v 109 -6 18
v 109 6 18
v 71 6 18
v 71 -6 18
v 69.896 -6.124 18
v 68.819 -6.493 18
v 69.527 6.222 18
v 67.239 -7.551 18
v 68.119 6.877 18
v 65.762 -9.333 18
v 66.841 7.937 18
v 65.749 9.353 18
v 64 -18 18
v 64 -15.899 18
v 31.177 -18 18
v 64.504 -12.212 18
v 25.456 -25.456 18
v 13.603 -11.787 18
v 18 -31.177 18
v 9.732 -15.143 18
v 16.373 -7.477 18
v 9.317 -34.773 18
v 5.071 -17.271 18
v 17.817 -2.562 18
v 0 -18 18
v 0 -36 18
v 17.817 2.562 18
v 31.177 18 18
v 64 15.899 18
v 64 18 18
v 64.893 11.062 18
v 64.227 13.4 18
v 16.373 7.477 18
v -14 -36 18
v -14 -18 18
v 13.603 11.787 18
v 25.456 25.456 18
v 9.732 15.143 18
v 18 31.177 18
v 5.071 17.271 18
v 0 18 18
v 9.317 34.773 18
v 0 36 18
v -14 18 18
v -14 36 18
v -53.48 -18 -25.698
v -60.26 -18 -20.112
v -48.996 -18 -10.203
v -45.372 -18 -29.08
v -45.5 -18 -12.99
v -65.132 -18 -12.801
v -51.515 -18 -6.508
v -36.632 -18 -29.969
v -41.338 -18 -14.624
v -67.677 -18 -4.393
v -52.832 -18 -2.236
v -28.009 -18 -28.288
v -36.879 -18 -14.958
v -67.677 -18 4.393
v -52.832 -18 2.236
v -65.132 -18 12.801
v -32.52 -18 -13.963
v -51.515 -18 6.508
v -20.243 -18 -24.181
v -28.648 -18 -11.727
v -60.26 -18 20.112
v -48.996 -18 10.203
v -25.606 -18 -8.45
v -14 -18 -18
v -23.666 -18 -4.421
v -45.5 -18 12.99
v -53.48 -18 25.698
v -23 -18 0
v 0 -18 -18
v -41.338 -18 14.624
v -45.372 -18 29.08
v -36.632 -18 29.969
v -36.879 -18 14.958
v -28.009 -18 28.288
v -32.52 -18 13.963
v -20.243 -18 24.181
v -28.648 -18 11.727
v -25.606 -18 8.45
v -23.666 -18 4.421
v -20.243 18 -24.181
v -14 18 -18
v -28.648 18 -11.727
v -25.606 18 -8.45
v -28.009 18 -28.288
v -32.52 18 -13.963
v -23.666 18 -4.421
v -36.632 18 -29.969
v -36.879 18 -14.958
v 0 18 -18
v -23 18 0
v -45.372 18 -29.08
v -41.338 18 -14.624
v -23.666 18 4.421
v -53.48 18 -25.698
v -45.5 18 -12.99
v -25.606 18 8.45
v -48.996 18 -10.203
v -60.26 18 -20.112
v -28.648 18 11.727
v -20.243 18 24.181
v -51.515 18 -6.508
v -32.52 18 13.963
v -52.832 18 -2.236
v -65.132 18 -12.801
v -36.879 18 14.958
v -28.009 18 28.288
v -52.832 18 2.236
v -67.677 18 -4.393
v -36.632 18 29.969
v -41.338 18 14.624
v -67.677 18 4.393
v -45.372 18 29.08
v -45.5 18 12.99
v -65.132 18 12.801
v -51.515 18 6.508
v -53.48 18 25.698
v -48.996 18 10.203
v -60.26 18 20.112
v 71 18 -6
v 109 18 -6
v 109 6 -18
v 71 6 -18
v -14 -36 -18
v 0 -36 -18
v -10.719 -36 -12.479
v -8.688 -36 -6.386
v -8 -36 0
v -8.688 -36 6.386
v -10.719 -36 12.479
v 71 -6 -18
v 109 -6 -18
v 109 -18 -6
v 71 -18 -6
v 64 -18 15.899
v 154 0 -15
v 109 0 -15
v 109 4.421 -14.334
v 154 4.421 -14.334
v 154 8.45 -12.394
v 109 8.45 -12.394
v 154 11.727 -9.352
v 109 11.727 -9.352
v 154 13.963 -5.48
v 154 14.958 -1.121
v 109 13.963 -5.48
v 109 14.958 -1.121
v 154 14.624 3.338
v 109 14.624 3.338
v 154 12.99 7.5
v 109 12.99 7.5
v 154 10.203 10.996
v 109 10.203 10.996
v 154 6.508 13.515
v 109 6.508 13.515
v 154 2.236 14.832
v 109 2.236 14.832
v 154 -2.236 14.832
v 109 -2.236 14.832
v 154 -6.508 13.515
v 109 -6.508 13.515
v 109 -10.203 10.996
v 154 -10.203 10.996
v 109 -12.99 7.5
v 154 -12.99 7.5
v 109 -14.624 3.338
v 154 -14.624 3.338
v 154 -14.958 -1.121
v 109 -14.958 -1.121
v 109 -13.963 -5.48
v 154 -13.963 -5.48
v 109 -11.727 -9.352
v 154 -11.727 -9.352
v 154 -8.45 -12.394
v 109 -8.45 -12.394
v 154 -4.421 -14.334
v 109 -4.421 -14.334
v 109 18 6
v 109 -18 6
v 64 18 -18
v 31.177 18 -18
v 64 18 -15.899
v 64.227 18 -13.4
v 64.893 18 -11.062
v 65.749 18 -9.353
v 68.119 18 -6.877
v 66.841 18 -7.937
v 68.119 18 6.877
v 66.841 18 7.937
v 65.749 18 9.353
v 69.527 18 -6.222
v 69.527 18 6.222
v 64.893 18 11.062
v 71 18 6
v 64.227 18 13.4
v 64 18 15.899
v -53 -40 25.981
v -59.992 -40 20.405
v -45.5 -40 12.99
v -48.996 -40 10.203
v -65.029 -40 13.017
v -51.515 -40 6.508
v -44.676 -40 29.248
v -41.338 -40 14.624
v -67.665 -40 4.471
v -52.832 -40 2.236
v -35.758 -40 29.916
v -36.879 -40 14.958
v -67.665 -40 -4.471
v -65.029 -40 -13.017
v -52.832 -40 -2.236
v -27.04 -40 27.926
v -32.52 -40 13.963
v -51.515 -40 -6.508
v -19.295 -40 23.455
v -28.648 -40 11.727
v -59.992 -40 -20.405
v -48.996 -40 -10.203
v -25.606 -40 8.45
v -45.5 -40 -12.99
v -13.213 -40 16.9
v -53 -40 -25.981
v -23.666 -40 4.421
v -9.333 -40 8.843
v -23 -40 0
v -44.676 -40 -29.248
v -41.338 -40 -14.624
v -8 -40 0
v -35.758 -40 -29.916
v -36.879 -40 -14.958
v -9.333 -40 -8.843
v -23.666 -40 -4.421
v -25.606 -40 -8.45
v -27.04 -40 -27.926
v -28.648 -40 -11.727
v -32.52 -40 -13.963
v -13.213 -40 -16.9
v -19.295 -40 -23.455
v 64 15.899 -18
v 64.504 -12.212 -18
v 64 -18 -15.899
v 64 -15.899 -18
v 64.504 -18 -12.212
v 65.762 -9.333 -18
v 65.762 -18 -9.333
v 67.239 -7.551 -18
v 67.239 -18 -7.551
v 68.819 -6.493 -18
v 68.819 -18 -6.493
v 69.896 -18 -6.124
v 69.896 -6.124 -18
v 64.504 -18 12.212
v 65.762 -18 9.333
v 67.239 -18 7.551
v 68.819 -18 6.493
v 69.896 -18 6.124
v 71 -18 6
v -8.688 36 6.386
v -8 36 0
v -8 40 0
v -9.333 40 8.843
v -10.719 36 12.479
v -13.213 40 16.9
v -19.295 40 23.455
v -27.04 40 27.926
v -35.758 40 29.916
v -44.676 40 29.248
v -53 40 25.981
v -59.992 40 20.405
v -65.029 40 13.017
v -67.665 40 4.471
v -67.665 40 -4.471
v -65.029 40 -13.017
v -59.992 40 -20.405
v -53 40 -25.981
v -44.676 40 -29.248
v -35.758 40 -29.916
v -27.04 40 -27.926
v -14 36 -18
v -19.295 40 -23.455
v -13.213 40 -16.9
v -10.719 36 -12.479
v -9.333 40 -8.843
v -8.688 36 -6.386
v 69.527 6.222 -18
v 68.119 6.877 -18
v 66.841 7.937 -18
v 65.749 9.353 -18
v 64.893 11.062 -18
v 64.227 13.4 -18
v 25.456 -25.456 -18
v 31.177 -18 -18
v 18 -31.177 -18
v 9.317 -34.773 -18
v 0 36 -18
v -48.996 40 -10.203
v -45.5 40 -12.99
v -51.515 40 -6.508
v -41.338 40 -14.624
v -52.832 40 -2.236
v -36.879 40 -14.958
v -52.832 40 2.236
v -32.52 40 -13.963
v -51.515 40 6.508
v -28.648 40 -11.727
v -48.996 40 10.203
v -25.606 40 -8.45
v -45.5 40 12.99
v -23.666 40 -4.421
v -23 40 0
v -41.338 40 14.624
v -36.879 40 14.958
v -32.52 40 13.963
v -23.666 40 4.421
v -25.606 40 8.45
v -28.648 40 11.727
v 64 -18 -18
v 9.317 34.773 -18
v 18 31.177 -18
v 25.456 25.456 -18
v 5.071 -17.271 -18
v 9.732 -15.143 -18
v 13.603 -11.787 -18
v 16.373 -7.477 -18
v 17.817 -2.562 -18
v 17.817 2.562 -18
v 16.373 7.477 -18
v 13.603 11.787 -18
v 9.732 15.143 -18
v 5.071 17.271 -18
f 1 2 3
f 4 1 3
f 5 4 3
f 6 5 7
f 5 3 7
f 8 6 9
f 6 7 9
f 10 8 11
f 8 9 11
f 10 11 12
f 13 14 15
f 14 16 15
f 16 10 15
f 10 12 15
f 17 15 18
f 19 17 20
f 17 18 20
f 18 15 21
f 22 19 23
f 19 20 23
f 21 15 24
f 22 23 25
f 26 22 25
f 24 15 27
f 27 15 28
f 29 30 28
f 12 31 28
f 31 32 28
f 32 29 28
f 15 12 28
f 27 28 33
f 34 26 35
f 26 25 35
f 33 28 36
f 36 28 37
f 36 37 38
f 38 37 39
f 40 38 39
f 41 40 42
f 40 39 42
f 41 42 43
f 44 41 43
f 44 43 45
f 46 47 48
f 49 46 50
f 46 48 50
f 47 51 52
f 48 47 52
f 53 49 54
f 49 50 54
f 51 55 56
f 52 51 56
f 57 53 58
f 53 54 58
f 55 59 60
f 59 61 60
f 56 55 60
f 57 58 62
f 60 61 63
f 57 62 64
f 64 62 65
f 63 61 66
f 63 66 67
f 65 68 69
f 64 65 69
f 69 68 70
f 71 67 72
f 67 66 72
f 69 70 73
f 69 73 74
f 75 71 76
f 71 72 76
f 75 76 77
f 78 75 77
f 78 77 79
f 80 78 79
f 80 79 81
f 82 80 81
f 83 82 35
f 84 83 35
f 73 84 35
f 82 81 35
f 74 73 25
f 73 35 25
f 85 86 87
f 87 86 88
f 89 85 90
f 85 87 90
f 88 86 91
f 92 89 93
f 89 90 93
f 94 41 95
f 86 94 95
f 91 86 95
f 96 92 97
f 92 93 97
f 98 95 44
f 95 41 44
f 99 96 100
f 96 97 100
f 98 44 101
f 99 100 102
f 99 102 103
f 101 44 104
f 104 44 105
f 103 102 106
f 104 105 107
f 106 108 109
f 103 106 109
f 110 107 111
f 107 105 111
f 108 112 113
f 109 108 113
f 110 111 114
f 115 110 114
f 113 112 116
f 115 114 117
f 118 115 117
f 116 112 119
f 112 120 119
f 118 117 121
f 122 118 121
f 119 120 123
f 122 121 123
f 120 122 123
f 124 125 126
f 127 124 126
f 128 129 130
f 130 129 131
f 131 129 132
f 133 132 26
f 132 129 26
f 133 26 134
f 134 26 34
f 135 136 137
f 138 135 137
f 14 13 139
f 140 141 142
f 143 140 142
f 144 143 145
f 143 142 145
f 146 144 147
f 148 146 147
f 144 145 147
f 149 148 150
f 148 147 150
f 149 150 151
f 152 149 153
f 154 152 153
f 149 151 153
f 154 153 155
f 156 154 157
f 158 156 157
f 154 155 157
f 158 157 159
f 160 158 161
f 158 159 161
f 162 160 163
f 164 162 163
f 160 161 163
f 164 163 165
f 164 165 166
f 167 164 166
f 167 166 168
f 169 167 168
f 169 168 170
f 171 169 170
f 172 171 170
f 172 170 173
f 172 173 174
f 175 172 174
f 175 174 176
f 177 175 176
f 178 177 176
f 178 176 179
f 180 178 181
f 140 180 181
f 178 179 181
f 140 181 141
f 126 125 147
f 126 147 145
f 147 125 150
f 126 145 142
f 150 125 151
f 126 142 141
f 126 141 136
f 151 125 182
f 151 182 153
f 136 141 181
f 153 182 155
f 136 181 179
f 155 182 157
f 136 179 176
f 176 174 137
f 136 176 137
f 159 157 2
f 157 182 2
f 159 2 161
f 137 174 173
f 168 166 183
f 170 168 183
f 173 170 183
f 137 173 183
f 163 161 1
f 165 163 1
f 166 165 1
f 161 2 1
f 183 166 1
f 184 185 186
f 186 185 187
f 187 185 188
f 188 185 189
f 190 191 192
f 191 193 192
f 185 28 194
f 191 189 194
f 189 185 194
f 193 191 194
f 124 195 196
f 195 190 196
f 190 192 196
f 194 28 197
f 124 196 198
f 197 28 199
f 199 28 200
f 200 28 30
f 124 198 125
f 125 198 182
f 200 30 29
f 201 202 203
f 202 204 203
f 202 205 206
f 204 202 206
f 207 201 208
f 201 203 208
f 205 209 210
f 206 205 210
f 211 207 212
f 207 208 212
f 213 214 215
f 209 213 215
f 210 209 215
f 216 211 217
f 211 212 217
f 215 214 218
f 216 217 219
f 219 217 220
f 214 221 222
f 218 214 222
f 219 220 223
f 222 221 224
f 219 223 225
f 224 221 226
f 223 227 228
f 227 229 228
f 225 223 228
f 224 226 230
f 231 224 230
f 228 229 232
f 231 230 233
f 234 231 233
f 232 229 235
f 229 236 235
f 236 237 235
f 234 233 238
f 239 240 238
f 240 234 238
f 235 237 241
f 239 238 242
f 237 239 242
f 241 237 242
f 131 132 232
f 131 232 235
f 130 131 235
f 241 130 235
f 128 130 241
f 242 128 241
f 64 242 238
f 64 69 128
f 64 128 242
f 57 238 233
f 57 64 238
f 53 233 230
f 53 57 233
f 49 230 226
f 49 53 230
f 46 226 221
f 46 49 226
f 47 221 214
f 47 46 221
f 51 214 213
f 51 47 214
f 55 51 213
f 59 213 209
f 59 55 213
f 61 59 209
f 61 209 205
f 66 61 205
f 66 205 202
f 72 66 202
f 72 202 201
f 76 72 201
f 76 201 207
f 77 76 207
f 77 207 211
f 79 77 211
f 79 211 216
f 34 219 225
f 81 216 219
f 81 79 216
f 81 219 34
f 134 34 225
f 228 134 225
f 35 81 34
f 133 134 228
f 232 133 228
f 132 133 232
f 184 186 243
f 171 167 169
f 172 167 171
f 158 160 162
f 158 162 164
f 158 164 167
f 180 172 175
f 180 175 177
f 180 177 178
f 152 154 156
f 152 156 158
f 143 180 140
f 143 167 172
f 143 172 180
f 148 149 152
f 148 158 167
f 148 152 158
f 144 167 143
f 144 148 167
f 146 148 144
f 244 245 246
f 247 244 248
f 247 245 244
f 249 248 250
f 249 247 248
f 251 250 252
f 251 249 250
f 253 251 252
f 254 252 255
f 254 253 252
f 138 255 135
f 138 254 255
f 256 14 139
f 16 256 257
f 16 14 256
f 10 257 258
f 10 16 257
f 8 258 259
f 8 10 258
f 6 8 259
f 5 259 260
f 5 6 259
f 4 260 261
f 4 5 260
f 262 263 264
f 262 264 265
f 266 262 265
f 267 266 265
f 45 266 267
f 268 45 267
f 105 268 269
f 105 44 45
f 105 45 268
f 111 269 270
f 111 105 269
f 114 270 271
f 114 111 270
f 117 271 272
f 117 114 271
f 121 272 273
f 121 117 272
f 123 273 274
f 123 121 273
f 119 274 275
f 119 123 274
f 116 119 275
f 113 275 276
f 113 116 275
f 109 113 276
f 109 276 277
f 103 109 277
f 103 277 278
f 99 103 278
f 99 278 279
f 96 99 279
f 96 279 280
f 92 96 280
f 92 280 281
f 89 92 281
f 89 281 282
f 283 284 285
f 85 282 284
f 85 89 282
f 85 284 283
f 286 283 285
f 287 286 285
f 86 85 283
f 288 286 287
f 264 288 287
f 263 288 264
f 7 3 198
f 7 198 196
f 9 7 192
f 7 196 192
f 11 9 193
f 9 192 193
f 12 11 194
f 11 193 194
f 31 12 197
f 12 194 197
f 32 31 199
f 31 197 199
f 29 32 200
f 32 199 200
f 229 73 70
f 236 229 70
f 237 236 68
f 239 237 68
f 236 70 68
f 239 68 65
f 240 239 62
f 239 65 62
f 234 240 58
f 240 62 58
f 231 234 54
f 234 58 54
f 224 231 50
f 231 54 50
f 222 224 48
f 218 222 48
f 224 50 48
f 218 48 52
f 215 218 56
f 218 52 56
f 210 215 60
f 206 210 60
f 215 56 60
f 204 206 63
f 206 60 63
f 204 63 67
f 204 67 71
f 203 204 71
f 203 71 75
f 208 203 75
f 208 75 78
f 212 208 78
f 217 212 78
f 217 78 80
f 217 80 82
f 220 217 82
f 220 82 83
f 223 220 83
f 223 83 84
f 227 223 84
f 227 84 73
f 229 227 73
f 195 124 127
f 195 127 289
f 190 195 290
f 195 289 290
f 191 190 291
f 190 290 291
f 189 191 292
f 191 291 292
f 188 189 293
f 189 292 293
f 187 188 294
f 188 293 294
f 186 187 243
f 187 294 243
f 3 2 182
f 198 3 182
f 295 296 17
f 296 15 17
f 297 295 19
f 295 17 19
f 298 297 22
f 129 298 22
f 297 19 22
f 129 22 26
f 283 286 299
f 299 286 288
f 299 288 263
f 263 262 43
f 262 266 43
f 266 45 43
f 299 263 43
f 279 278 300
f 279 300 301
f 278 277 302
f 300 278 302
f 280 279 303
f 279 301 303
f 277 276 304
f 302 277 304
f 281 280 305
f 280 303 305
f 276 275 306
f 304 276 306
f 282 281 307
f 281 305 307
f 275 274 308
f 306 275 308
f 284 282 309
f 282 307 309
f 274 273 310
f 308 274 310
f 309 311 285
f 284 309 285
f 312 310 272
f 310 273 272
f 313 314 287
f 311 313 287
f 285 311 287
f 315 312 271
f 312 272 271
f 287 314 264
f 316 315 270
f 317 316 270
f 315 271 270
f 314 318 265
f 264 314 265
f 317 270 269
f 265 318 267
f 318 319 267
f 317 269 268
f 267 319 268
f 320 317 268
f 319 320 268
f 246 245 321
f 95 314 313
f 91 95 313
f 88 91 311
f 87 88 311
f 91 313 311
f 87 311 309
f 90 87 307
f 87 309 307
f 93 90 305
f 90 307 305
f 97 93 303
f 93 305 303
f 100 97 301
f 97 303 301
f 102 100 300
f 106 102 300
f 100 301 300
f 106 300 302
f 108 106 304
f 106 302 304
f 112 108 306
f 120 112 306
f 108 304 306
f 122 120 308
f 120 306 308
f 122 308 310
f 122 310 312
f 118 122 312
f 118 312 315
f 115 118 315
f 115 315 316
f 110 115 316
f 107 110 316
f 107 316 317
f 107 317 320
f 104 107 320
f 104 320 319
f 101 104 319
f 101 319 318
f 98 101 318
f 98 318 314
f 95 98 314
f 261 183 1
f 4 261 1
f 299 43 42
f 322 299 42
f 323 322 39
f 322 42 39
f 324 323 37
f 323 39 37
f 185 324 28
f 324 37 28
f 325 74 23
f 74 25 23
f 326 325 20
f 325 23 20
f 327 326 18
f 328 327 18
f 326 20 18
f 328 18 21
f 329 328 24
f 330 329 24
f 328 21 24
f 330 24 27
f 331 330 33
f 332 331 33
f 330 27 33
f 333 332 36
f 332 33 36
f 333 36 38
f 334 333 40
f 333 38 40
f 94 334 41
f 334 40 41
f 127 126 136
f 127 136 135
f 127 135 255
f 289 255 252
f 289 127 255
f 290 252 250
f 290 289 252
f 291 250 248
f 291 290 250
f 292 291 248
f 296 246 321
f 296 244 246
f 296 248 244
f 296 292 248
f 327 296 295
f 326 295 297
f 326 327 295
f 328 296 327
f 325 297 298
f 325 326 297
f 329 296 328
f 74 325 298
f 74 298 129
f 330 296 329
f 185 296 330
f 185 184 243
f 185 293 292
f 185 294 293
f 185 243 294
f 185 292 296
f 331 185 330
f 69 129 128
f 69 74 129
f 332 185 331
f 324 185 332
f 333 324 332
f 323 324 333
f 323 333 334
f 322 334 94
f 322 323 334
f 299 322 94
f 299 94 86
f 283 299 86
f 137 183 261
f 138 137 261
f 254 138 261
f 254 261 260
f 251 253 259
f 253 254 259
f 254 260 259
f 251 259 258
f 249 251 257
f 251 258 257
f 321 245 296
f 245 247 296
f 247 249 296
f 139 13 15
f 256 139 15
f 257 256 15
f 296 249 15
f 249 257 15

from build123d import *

# Parameters (mm, degrees)
BOSS_EXTRUDE1_DEPTH = 18
SKETCH2_R           = 30
BOSS_EXTRUDE2_DEPTH = 22
SKETCH3_R           = 30
BOSS_EXTRUDE3_DEPTH = 22
SKETCH4_R           = 15
CUT_EXTRUDE1_DEPTH  = 81
CUT_EXTRUDE2_DEPTH  = 45
FILLET1_R           = 7
SKETCH6_R           = 15
BOSS_EXTRUDE4_DEPTH = 45


with BuildPart() as part:
    # Sketch1 → Boss-Extrude1 (new body, symmetric)
    with BuildSketch(Plane.XY):
        with BuildLine():
            Line((31.176914536, 18), (109, 18))
            Line((109, 18), (109, -18))
            Line((109, -18), (31.176914536, -18))
            ThreePointArc((31.176914536, -18), (18, -31.176914536), (0, -36))
            Line((0, -36), (-38, -36))
            Line((-38, -36), (-38, -18))
            Line((-38, -18), (0, -18))
            ThreePointArc((0, -18), (18, 0), (0, 18))
            Line((0, 18), (-38, 18))
            Line((-38, 18), (-38, 36))
            Line((-38, 36), (0, 36))
            ThreePointArc((0, 36), (18, 31.176914536), (31.176914536, 18))
        make_face()
    extrude(amount=BOSS_EXTRUDE1_DEPTH, both=True)

    # Sketch2 → Boss-Extrude2 (add)
    with BuildSketch(Plane.XZ.offset(-18)):
        with Locations((-38, 0)):
            Circle(SKETCH2_R)
    extrude(amount=-BOSS_EXTRUDE2_DEPTH)

    # Sketch3 → Boss-Extrude3 (add)
    with BuildSketch(Plane(origin=(0, -18, 0), x_dir=(1, 0, 0), z_dir=(0, 1, 0))):
        with Locations((-38, 0)):
            Circle(SKETCH3_R)
    extrude(amount=-BOSS_EXTRUDE3_DEPTH)

    # Sketch4 → Cut-Extrude1 (cut, through all)
    with BuildSketch(Plane(origin=(0, 40, 0), x_dir=(1, 0, 0), z_dir=(0, 1, 0))):
        with Locations((-38, 0)):
            Circle(SKETCH4_R)
    extrude(amount=-CUT_EXTRUDE1_DEPTH, mode=Mode.SUBTRACT)

    # Sketch5 → Cut-Extrude2 (cut)
    with BuildSketch(Plane(origin=(109, 0, 0), x_dir=(0, 0, -1), z_dir=(1, 0, 0))):
        Polygon((6, 18), (18, 6), (18, 18), align=None)
        Polygon((18, -18), (18, -6), (6, -18), align=None)
        Polygon((-18, -18), (-6, -18), (-18, -6), align=None)
        Polygon((-18, 18), (-18, 6), (-6, 18), align=None)
    extrude(amount=-CUT_EXTRUDE2_DEPTH, mode=Mode.SUBTRACT)

    # Fillet1
    fillet1_edges = [part.edges().sort_by_distance(p)[0] for p in [
        (64, 12, 12),
        (64, -12, 12),
        (64, -12, -12),
        (64, 12, -12),
    ]]
    fillet(fillet1_edges, radius=FILLET1_R)

    # Sketch6 → Boss-Extrude4 (add)
    with BuildSketch(Plane(origin=(109, 0, 0), x_dir=(0, 0, -1), z_dir=(1, 0, 0))):
        Circle(SKETCH6_R)
    extrude(amount=BOSS_EXTRUDE4_DEPTH)


solid = part.part
